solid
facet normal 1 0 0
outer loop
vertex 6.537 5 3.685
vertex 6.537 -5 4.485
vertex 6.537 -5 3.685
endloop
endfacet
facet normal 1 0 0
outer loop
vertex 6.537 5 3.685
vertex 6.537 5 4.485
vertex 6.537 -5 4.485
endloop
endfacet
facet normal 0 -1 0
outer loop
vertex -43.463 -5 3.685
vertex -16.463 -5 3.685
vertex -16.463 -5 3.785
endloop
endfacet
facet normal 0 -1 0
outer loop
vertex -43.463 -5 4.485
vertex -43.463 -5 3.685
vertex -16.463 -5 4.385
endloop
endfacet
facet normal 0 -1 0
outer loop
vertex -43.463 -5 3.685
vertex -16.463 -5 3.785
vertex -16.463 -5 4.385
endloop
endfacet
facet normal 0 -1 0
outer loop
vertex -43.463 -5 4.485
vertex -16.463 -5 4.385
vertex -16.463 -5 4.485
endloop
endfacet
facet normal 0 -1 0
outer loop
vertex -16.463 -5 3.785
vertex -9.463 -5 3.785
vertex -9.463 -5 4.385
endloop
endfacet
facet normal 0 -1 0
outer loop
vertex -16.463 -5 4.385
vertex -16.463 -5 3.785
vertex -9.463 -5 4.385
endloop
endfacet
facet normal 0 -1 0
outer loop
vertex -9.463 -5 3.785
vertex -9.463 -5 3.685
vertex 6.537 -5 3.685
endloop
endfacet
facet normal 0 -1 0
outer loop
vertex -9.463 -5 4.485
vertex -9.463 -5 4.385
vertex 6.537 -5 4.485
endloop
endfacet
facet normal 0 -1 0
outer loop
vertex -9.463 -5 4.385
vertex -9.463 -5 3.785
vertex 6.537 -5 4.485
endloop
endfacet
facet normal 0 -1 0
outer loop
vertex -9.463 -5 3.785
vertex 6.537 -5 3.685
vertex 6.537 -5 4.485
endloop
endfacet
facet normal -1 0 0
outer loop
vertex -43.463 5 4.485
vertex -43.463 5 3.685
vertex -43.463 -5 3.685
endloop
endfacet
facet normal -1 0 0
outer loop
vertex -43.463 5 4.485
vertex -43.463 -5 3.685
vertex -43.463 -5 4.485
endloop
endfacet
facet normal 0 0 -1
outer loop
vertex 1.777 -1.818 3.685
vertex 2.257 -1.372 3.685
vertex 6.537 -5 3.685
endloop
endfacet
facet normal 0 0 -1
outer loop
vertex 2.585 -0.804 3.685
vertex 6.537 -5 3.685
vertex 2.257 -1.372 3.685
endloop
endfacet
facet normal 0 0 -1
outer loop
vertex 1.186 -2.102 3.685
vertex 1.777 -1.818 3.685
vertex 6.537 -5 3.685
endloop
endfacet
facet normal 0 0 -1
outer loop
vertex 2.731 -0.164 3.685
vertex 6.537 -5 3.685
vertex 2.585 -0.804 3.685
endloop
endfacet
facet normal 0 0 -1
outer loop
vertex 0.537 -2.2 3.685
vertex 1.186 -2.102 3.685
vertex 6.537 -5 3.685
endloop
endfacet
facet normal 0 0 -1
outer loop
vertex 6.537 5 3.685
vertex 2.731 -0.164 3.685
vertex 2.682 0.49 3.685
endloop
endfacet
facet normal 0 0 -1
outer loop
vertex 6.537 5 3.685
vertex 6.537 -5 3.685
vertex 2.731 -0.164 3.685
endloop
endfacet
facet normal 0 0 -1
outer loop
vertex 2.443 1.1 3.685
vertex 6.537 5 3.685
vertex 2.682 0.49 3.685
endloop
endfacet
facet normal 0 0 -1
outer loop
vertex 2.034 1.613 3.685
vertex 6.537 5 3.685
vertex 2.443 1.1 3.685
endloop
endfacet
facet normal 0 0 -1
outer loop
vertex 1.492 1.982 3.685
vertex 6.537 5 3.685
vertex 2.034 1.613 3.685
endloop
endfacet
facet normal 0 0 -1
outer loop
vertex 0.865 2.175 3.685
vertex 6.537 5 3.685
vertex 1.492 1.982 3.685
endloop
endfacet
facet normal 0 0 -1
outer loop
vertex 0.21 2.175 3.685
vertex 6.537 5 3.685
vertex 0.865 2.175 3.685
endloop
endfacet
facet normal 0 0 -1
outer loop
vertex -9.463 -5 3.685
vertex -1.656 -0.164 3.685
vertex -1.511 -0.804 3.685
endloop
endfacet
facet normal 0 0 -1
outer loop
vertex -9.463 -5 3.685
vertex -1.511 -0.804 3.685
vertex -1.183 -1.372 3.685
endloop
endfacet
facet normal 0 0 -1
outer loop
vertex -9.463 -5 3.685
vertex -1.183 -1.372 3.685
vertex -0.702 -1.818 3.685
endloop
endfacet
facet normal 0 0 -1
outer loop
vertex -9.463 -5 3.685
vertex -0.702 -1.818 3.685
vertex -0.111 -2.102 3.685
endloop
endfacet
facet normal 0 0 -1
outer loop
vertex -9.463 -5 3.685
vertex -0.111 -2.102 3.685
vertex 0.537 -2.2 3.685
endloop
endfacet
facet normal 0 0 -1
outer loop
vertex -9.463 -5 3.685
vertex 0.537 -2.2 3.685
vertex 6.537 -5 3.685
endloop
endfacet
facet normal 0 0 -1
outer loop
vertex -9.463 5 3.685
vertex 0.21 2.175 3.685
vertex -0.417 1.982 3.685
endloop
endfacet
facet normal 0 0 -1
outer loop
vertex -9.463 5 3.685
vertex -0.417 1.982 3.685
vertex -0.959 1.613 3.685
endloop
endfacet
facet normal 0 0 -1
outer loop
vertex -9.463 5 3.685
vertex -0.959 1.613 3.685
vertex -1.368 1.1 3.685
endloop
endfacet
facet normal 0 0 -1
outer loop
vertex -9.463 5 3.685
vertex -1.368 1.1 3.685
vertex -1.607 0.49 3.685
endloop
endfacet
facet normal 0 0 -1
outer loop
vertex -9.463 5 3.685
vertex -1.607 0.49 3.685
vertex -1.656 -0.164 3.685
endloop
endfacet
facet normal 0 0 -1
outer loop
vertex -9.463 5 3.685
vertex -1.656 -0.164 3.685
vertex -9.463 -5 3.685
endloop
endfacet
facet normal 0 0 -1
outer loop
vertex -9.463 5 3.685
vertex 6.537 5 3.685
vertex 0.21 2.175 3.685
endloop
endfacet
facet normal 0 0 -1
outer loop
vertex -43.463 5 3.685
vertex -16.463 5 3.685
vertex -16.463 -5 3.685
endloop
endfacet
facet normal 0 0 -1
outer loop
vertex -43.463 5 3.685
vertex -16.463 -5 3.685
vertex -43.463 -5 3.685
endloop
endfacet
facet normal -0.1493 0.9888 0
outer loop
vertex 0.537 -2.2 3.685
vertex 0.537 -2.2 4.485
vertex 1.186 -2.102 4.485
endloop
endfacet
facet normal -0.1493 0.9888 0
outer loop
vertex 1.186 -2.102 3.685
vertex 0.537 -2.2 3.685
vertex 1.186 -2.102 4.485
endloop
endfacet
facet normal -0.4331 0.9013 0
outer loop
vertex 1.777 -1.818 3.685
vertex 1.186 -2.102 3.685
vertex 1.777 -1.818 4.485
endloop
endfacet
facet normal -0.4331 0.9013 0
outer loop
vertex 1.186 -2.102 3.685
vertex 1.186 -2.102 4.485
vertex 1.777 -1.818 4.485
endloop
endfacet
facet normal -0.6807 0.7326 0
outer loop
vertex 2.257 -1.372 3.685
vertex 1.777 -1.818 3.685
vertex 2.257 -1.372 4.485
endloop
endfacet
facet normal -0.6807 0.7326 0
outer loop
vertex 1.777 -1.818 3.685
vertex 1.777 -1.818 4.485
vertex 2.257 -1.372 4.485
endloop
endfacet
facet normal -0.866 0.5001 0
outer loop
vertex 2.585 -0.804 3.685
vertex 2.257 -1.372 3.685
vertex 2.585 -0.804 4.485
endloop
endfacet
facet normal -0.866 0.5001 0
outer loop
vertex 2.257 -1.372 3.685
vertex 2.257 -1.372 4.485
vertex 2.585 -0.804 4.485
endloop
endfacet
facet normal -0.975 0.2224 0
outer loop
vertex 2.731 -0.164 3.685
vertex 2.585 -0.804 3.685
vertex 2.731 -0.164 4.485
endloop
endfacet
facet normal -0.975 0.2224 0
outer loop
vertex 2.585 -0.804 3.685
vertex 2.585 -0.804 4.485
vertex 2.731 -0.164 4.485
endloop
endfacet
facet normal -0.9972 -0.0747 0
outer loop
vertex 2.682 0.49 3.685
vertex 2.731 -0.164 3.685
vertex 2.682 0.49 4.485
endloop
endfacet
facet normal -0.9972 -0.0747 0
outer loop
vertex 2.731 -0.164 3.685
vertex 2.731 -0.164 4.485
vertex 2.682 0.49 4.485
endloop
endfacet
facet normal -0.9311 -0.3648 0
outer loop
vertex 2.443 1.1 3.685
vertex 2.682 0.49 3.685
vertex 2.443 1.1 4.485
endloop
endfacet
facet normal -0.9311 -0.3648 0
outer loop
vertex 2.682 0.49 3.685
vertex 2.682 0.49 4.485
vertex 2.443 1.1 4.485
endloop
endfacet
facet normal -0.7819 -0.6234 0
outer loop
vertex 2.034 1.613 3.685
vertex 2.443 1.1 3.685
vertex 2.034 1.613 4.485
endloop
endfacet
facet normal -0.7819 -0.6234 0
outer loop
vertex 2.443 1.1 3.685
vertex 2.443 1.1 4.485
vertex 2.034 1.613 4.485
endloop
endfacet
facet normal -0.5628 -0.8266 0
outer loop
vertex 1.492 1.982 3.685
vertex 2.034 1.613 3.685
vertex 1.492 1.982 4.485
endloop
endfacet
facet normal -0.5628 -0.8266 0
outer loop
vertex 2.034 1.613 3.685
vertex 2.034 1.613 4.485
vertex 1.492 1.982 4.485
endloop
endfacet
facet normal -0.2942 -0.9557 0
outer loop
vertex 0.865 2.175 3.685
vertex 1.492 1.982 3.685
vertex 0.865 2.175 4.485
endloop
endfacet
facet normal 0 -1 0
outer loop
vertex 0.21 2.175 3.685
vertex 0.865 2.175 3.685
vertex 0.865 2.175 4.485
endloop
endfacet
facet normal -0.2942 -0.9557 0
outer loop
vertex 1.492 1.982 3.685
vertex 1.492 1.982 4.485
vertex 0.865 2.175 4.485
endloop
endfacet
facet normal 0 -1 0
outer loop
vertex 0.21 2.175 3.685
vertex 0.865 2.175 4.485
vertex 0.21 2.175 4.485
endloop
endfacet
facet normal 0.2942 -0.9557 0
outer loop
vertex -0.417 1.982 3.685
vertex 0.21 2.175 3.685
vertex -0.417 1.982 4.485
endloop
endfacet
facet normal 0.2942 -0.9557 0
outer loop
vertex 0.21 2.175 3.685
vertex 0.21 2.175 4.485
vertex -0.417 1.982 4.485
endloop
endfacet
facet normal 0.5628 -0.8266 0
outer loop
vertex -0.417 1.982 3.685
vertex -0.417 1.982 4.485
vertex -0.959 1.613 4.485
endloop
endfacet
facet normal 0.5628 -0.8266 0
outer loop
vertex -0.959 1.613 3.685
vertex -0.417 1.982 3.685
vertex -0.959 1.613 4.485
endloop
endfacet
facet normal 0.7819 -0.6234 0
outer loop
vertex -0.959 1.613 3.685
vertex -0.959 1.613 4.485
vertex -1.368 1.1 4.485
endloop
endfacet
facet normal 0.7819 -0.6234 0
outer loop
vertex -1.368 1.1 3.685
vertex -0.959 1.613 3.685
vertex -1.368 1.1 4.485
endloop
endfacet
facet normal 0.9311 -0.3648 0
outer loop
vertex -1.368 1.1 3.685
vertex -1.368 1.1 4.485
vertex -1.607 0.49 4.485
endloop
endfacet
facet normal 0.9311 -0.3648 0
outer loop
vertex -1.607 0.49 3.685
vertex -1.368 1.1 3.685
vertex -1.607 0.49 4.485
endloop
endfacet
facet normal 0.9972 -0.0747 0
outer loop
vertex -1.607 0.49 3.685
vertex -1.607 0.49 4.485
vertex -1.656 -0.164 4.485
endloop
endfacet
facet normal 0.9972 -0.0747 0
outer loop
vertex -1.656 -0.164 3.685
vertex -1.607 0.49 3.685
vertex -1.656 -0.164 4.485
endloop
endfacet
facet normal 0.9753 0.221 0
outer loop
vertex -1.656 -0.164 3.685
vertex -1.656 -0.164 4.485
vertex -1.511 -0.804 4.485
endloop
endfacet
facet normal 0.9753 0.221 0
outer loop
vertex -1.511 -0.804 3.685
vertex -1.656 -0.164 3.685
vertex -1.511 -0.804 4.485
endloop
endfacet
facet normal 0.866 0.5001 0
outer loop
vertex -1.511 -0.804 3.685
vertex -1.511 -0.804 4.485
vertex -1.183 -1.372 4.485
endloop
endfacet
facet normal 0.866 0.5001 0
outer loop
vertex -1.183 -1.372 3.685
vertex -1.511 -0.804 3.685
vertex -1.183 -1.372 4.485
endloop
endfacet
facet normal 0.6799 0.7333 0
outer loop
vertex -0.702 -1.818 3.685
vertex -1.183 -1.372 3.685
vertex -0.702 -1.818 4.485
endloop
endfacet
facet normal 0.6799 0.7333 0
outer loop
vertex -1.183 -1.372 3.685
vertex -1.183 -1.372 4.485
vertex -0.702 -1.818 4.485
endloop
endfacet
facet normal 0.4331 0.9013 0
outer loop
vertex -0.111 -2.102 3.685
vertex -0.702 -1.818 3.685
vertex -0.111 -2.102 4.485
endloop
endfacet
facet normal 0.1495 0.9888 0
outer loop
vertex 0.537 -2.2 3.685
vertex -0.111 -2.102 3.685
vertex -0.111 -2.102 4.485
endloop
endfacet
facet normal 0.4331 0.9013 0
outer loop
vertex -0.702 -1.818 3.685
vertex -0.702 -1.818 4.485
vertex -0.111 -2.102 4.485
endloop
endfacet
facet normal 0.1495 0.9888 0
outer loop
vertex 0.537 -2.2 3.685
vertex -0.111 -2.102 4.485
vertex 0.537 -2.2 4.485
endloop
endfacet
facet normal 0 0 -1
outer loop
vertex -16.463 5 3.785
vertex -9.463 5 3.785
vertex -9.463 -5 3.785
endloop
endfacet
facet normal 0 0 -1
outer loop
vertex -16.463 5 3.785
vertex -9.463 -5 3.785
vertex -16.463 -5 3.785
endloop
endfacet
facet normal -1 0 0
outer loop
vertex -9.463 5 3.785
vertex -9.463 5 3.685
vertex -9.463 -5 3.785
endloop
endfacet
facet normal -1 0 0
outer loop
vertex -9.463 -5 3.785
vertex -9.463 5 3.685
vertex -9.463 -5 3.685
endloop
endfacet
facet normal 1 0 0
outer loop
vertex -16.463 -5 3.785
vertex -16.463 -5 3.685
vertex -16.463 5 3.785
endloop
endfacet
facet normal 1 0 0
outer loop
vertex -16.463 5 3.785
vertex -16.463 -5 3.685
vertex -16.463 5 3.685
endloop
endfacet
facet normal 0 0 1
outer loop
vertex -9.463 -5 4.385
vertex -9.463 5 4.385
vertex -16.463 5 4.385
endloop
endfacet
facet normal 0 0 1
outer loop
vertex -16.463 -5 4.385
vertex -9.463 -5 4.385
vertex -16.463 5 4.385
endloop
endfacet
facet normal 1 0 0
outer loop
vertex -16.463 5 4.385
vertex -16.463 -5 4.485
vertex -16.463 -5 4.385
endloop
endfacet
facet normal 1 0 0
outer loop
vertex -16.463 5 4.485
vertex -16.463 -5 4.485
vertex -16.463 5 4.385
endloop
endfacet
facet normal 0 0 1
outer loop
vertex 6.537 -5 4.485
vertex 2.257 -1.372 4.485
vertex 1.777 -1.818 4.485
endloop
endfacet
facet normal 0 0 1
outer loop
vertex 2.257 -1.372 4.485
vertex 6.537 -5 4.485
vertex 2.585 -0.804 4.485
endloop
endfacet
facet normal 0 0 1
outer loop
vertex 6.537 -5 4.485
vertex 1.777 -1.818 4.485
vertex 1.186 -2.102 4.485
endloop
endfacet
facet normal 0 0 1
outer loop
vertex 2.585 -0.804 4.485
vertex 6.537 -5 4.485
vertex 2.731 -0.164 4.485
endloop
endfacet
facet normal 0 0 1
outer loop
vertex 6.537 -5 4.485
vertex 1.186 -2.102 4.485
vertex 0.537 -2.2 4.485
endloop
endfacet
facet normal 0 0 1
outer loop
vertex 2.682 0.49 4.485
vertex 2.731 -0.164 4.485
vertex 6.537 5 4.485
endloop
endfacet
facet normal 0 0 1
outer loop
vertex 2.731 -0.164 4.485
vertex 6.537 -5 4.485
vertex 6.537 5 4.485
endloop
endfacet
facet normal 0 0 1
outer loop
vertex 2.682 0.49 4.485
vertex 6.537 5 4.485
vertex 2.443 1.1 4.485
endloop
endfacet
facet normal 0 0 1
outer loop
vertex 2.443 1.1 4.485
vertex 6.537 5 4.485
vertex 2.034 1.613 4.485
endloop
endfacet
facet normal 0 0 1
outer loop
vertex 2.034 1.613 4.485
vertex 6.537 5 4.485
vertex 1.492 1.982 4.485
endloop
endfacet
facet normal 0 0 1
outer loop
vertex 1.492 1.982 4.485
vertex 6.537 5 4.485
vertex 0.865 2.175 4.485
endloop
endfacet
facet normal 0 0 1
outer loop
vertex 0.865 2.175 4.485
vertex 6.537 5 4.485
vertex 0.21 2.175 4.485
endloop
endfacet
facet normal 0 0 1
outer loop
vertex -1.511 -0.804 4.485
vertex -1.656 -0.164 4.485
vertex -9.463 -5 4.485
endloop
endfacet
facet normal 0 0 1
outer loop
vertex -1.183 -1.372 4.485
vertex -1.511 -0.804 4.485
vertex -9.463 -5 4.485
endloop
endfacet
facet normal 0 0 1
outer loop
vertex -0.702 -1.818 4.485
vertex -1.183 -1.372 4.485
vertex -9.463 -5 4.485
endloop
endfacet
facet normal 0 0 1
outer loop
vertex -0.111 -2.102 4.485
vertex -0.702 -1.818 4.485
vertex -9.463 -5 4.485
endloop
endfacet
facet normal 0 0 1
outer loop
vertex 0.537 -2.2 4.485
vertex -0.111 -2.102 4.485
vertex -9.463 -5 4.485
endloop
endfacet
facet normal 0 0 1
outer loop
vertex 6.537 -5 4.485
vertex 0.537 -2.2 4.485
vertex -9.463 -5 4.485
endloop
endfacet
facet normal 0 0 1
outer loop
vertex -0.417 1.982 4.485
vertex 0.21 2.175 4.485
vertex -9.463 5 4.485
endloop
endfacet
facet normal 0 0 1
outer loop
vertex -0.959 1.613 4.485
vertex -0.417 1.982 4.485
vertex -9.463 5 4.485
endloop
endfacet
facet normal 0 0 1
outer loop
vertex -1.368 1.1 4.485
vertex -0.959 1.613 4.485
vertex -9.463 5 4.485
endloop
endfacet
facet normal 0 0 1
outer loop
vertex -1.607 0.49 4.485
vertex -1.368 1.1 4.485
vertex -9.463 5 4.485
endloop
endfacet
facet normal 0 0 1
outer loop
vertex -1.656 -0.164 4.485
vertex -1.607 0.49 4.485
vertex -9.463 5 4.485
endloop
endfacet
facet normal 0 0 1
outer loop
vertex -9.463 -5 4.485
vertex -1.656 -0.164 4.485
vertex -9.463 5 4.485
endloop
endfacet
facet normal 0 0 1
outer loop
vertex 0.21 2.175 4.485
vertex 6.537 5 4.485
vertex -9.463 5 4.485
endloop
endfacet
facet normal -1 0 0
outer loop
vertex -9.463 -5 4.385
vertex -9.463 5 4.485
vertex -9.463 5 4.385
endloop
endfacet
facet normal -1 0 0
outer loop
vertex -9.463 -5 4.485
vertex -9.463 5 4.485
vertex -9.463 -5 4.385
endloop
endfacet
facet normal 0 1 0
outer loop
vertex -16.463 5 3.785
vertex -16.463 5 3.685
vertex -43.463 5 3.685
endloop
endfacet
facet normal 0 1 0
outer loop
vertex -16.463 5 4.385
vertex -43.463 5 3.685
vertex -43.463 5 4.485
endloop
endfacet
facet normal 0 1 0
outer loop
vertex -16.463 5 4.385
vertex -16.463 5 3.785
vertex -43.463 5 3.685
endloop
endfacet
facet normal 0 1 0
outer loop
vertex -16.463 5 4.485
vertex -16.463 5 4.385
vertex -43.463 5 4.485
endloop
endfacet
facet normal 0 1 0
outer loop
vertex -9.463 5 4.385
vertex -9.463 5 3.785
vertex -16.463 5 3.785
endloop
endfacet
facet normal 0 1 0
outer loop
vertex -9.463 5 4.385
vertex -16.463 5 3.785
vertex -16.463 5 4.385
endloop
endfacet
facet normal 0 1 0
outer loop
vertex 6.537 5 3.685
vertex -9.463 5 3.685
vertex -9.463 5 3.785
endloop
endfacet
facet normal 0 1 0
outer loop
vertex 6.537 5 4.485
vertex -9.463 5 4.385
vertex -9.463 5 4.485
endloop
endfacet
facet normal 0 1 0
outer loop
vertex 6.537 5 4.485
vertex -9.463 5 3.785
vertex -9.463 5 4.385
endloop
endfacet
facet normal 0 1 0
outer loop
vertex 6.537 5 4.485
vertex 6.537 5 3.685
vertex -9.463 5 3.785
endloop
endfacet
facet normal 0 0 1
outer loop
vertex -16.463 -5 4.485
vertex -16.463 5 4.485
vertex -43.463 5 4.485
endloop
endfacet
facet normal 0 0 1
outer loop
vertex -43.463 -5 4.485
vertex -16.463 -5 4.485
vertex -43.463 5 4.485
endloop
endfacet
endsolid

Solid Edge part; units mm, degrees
sketch "Sketch1" plane through (0, 0, 0) normal (0, -1, 0) x (1, 0, 0)
  line L0 (6.5374, 3.6848) -> (-43.4626, 3.6848)
  line L1 (6.5374, 4.4848) -> (6.5374, 3.6848)
  line L2 (6.5374, 4.4848) -> (-43.4626, 4.4848)
  line L3 (-43.4626, 3.6848) -> (-43.4626, 4.4848)
  dimension "D1" = 50
extrude "Protrusion1" add sketch "Sketch1" along normal mid plane 10
sketch "Sketch2" plane through (-22.7754, 0, 5) normal (0, 0, 1) x (0, -1, 0)
  circle A0 centre (0, 23.3128) radius 2.2
  dimension "D1" = 6
  dimension "D2" = 5
extrude "Cutout1" cut sketch "Sketch2" along normal through all and the other way through all
sketch "Sketch3" plane through (-18.4626, 0, 4.4848) normal (0, 0, 1) x (1, 0, 0)
  line L0 (9, 5) -> (9, -5)
  line L1 (9, -5) -> (2, -5)
  line L2 (2, -5) -> (2, 5)
  line L3 (2, 5) -> (9, 5)
extrude "ExtrudedCutout_3" cut sketch "Sketch3" against normal blind 0.1
sketch "Sketch4" plane through (-18.4626, 0, 3.6848) normal (0, 0, -1) x (1, 0, 0)
  line L0 (2, 5) -> (2, -5)
  line L1 (9, -5) -> (2, -5)
  line L2 (9, -5) -> (9, 5)
  line L3 (2, 5) -> (9, 5)
extrude "ExtrudedCutout_4" cut sketch "Sketch4" against normal blind 0.1
properties material "Steel"
